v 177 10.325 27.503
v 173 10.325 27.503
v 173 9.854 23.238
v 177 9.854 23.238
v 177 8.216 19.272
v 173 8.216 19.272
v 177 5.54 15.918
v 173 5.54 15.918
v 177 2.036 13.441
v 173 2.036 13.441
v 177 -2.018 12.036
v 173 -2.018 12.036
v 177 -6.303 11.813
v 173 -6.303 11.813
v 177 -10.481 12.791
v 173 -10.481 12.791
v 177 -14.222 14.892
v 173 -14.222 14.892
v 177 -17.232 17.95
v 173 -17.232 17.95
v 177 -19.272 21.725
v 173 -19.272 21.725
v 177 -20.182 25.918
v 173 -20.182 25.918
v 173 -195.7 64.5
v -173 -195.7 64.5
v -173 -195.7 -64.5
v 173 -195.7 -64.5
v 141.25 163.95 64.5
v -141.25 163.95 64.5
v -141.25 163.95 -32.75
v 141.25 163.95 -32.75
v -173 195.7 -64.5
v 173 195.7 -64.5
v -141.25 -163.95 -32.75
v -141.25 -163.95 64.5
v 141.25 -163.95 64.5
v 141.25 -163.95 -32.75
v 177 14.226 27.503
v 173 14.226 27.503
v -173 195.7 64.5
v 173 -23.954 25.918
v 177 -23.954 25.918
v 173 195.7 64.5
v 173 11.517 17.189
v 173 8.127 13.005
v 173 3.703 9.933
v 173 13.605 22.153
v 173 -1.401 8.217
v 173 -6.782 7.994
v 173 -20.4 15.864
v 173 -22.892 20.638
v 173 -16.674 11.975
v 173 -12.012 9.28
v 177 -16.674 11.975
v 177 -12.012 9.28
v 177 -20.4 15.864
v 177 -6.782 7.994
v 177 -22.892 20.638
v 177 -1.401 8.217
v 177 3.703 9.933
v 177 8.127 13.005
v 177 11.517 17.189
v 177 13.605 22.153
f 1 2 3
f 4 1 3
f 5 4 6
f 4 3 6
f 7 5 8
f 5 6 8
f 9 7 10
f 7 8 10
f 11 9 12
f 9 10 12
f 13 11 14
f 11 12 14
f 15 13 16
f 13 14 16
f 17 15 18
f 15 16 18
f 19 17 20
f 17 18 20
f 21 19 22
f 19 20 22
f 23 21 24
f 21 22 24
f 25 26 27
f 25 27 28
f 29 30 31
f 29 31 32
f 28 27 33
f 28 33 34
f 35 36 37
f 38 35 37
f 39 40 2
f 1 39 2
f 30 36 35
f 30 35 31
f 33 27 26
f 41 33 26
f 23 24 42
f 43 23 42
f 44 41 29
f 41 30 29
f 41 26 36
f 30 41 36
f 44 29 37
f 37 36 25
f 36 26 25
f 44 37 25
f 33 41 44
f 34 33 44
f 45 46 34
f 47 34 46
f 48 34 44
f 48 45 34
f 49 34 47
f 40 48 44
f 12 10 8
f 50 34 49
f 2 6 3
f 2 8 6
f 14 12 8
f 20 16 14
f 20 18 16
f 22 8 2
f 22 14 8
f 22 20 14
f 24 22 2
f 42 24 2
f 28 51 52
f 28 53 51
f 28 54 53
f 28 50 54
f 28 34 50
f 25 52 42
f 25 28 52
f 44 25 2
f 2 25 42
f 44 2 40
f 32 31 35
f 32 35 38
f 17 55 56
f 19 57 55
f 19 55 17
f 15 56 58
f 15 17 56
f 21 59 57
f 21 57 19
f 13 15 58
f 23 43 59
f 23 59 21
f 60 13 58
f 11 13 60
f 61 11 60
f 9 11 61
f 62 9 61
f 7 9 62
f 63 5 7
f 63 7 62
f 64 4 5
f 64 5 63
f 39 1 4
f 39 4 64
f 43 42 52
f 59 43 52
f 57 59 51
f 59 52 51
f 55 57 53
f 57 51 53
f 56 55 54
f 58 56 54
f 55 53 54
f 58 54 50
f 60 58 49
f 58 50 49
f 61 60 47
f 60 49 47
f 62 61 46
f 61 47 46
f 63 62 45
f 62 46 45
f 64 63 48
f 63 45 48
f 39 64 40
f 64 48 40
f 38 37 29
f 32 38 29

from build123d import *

# Parameters (mm, degrees)
F0_W     = 346
F0_H     = 129
F1_DEPTH = 195.7
F2_W     = 282.5
F2_H     = 327.9
F3_DEPTH = 97.25
F5_DEPTH = 4


# Not quite as in the source:
# - a feature names something its author has since deleted; it is built from what else it names


with BuildPart() as f1:
    # F0 (on Front) → F1 (new body, symmetric)
    with BuildSketch(Plane.XZ):
        Rectangle(F0_W, F0_H)
    extrude(amount=F1_DEPTH, both=True)

    # F2 (on face) → F3 (cut)
    with BuildSketch(Plane.XY.offset(64.5)):
        Rectangle(F2_W, F2_H)
    extrude(amount=-F3_DEPTH, mode=Mode.SUBTRACT)

    # F4 (on face) → F5 (join)
    with BuildSketch(Plane.YZ.offset(173)):
        with BuildLine():
            Line((-20.1823599637, 25.9178485721), (-23.953853175, 25.9178485721))
            ThreePointArc((-23.953853175, 25.9178485721), (-4.0838683271, 7.9147781718), (14.2255900428, 27.5027994066))
            Line((14.2255900428, 27.5027994066), (10.32506302, 27.5027994066))
            ThreePointArc((10.32506302, 27.5027994066), (-4.1526228185, 11.7732405564), (-20.1823599637, 25.9178485721))
        make_face()
    extrude(amount=F5_DEPTH)


solid = f1.part
